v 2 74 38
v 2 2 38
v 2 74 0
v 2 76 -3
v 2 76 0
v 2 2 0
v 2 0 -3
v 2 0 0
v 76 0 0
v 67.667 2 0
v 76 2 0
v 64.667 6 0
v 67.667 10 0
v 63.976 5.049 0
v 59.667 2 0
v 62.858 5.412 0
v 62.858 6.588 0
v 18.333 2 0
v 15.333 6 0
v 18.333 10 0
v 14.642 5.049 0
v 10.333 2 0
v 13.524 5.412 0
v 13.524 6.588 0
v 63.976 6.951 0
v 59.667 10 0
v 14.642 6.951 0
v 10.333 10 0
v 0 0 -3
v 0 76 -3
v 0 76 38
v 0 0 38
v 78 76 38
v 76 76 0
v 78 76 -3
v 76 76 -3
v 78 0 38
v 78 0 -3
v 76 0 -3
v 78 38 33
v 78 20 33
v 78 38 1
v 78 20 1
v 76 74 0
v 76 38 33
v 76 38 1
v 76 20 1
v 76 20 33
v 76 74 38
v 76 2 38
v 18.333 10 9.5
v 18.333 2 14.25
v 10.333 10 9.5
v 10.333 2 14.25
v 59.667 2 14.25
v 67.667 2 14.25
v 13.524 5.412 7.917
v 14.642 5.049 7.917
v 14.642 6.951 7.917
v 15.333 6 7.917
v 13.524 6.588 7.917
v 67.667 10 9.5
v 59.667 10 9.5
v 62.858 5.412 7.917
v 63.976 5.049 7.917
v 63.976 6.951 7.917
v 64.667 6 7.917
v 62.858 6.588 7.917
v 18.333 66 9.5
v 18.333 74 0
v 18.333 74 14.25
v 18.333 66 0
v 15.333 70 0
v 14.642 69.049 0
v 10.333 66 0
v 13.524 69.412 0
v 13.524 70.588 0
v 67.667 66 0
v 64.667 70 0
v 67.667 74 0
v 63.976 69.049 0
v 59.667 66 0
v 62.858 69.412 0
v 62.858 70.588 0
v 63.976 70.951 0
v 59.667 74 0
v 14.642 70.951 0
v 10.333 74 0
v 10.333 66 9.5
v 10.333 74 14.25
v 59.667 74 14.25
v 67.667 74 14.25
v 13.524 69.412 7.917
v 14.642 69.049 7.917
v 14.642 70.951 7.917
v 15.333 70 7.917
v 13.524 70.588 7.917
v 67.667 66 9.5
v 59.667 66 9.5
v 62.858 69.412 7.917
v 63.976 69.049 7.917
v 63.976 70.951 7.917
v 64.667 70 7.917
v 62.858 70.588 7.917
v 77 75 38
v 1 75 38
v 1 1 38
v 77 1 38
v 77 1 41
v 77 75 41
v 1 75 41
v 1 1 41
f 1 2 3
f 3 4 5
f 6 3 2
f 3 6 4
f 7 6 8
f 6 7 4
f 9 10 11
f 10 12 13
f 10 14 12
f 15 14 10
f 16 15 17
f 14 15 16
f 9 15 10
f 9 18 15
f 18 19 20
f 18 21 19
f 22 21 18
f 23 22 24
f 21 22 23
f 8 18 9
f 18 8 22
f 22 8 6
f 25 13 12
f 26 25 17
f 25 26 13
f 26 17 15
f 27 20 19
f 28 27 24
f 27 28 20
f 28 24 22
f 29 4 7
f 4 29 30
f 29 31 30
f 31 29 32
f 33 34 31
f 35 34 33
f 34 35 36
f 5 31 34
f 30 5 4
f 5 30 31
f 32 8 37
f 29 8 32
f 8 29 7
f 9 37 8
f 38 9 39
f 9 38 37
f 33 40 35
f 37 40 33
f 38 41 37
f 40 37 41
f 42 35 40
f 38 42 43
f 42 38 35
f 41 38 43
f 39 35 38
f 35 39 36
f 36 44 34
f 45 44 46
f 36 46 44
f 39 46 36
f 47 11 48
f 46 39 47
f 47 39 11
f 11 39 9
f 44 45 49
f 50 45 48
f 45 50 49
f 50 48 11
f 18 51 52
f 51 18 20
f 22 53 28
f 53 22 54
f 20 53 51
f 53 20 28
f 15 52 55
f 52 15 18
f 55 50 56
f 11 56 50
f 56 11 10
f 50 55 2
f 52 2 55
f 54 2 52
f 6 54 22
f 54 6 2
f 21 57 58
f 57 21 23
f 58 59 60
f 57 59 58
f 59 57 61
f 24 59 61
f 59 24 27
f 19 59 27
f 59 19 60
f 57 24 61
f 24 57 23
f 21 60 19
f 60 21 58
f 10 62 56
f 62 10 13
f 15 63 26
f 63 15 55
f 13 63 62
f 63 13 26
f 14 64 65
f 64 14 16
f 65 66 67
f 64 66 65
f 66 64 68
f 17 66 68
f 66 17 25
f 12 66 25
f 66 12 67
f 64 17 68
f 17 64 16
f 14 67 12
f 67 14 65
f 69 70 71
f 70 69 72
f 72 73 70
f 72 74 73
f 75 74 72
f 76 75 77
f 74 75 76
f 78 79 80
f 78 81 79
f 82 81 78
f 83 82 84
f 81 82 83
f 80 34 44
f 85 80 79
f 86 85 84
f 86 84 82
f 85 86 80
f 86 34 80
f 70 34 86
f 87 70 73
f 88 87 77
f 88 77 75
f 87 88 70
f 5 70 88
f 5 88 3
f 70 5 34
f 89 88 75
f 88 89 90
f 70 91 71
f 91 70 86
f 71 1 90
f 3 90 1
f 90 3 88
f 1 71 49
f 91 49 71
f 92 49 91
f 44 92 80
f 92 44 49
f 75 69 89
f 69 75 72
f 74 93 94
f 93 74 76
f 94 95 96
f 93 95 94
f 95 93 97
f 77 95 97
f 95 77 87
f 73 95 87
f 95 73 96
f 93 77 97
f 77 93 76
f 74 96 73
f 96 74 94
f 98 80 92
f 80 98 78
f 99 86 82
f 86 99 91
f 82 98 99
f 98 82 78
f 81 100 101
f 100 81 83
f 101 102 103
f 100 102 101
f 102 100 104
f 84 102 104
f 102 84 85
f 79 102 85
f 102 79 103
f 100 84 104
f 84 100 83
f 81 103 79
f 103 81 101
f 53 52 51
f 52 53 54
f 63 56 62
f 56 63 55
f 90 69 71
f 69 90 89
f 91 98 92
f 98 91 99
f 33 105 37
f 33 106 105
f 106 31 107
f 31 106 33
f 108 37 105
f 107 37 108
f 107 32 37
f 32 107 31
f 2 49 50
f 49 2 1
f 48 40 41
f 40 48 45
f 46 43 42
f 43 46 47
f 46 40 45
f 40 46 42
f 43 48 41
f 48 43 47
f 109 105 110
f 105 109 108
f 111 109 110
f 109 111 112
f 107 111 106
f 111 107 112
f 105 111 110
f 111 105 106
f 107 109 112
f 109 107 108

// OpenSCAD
// Set basic attributes
wallThickness = 2;
lidThickness = 3;
boxLengthInner = 74; 
boxWidthInner = 72;
boxHeightInner = 38;
screwFixingWidth = 8;
lipDepth = 3;
lidInStep = 1;
screwHoleDiameter = 1;

// Compound variables
screwFixingHeight = boxHeightInner / 4;

// NOTE - NOT USED IN THIS PROJECT BUT SETTTING THEM TO ZERO
// HAS THE SAME EFFECT AS REMOVING THE LOGIC FOR THEM. MIGHT
// WANT TO ADD BUTTONS BACK IN ONE DAY SO LEAVING LOGIC IN PLACE
lcdHoleLength =0;
lcdHoleWidth = 0;
buttonWidth = 0;

// Draw a 'ramp' polygon, i.e. a pyramid with a flat sqaure base
// Orientation can be 0, 1 (rotate about the centre by 90 deg), 2 (180), or 3 (270)
module drawRamp(baseWidth, baseLength, height, orientation) {
    translate([orientation > 0 && orientation < 3 ? baseWidth : 0, orientation > 1 && orientation < 4 ? baseLength : 0, 0])
    rotate([0,0,orientation * 90])
    polyhedron(
        points=[[0,0,0],
                [baseWidth,0,0],
                [baseWidth,baseLength,0],
                [0,baseLength,0],
                [0,0,height],
                [baseWidth,0,height]],
        faces=[[0,4,3],[0,1,5,4],[1,2,5],[2,3,4,5],[0,3,2,1]]);
}


// Create one of the ends
cube([wallThickness,boxWidthInner+(wallThickness*2),boxHeightInner]);



// Create the lips the 2 ends need for the wooden base to butt up to
translate([0,0,-lipDepth]) {
    cube([wallThickness,boxWidthInner+(wallThickness*2),lipDepth]);
    
    translate([boxLengthInner+wallThickness,0,0])
        cube([wallThickness,boxWidthInner+(wallThickness*2),lipDepth]);
}



// Create the 2 sides
translate([wallThickness, 0, 0]) cube([boxLengthInner,wallThickness,boxHeightInner]);
translate([wallThickness,boxWidthInner+wallThickness,0]) cube([boxLengthInner,wallThickness,boxHeightInner]);



// Create the screw fixings for the base. Initial translate(...) used to move the cursor inside the box
translate([wallThickness,wallThickness,0]) {
    difference() {
        translate([boxLengthInner/6 - (screwFixingWidth/2),0,0])
            cube(size=[screwFixingWidth,screwFixingWidth,screwFixingHeight]);
        translate([boxLengthInner/6,screwFixingWidth/2,0])
            cylinder(r=screwHoleDiameter,h=screwFixingHeight/6*5);
    }
    translate([boxLengthInner/6 - (screwFixingWidth/2),0,screwFixingHeight])
        drawRamp(screwFixingWidth,screwFixingWidth,screwFixingHeight/2,0);
        
    difference() {
        translate([((boxLengthInner/6*5) - (screwFixingWidth/2)),0,0])
            cube([screwFixingWidth,screwFixingWidth,screwFixingHeight]);
        translate([boxLengthInner/6*5,screwFixingWidth/2,0])
            cylinder(r=screwHoleDiameter,h=screwFixingHeight/6*5);
    }
    translate([((boxLengthInner/6*5) - (screwFixingWidth/2)),0,screwFixingHeight])
        drawRamp(screwFixingWidth,screwFixingWidth,screwFixingHeight/2,0);
        
    difference() {
        translate([boxLengthInner/6-(screwFixingWidth/2),boxWidthInner-screwFixingWidth,0])
            cube([screwFixingWidth,screwFixingWidth,screwFixingHeight]);
        translate([boxLengthInner/6,boxWidthInner-(screwFixingWidth/2),0])
            cylinder(r=screwHoleDiameter,h=screwFixingHeight/6*5);
    }
    translate([boxLengthInner/6-(screwFixingWidth/2),boxWidthInner-screwFixingWidth,screwFixingHeight])
        drawRamp(screwFixingWidth,screwFixingWidth,screwFixingHeight/2,2);

    difference() {
        translate([((boxLengthInner/6*5) - (screwFixingWidth/2)),boxWidthInner-screwFixingWidth,0])
            cube([screwFixingWidth,screwFixingWidth,screwFixingHeight]);
        translate([boxLengthInner/6*5,boxWidthInner-(screwFixingWidth/2),0])
            cylinder(r=screwHoleDiameter,h=screwFixingHeight/6*5);
    }
    translate([((boxLengthInner/6*5) - (screwFixingWidth/2)),boxWidthInner-screwFixingWidth,screwFixingHeight])
        drawRamp(screwFixingWidth,screwFixingWidth,screwFixingHeight/2,2);
}


// Create the other end, with a for the sockets to fit through
difference() {
translate([boxLengthInner+wallThickness,0,0])
    cube([wallThickness,boxWidthInner+(wallThickness*2),boxHeightInner]);
    
translate([boxLengthInner+wallThickness - 10,20,1]) // Doesn't matter about x dimensions very much
    cube([20,18,32]);
}



// Create the lid with holes cut out for the buttons and LCD.
// NOTE: IN THIS MODEL THERE ARE NO HOLES BUT HAVING CODED THE LOGIC
// FOR LAYING THEM OUT IT IS EASIER TO SET THEIR DIMENSIONS TO ZERO
// AND LEAVE IN THE LOGIC
difference() {
    difference() {
        difference() {
            difference() {
                difference() {
                    translate([lidInStep,lidInStep,boxHeightInner])
                        cube([boxLengthInner+(2*lidInStep),boxWidthInner+(2 * lidInStep),lidThickness]);
                    
                    translate([boxLengthInner/5,20,boxHeightInner - 10])
                        cube([buttonWidth,buttonWidth,40]);
                };
                
                translate([(boxLengthInner/5)*2,20,boxHeightInner - 10])
                    cube([buttonWidth,buttonWidth,40]);
            };
            
            translate([(boxLengthInner/5)*3,20,boxHeightInner - 10])
                cube([buttonWidth,buttonWidth,40]);
        };
        
        translate([boxLengthInner-(boxLengthInner/5),20,boxHeightInner - 10])
            cube([buttonWidth,buttonWidth,40]);
        
    };
    
    translate([(boxLengthInner/2)-(lcdHoleLength/2),70,boxHeightInner - 10])
        cube([lcdHoleLength,lcdHoleWidth,40]);
}
